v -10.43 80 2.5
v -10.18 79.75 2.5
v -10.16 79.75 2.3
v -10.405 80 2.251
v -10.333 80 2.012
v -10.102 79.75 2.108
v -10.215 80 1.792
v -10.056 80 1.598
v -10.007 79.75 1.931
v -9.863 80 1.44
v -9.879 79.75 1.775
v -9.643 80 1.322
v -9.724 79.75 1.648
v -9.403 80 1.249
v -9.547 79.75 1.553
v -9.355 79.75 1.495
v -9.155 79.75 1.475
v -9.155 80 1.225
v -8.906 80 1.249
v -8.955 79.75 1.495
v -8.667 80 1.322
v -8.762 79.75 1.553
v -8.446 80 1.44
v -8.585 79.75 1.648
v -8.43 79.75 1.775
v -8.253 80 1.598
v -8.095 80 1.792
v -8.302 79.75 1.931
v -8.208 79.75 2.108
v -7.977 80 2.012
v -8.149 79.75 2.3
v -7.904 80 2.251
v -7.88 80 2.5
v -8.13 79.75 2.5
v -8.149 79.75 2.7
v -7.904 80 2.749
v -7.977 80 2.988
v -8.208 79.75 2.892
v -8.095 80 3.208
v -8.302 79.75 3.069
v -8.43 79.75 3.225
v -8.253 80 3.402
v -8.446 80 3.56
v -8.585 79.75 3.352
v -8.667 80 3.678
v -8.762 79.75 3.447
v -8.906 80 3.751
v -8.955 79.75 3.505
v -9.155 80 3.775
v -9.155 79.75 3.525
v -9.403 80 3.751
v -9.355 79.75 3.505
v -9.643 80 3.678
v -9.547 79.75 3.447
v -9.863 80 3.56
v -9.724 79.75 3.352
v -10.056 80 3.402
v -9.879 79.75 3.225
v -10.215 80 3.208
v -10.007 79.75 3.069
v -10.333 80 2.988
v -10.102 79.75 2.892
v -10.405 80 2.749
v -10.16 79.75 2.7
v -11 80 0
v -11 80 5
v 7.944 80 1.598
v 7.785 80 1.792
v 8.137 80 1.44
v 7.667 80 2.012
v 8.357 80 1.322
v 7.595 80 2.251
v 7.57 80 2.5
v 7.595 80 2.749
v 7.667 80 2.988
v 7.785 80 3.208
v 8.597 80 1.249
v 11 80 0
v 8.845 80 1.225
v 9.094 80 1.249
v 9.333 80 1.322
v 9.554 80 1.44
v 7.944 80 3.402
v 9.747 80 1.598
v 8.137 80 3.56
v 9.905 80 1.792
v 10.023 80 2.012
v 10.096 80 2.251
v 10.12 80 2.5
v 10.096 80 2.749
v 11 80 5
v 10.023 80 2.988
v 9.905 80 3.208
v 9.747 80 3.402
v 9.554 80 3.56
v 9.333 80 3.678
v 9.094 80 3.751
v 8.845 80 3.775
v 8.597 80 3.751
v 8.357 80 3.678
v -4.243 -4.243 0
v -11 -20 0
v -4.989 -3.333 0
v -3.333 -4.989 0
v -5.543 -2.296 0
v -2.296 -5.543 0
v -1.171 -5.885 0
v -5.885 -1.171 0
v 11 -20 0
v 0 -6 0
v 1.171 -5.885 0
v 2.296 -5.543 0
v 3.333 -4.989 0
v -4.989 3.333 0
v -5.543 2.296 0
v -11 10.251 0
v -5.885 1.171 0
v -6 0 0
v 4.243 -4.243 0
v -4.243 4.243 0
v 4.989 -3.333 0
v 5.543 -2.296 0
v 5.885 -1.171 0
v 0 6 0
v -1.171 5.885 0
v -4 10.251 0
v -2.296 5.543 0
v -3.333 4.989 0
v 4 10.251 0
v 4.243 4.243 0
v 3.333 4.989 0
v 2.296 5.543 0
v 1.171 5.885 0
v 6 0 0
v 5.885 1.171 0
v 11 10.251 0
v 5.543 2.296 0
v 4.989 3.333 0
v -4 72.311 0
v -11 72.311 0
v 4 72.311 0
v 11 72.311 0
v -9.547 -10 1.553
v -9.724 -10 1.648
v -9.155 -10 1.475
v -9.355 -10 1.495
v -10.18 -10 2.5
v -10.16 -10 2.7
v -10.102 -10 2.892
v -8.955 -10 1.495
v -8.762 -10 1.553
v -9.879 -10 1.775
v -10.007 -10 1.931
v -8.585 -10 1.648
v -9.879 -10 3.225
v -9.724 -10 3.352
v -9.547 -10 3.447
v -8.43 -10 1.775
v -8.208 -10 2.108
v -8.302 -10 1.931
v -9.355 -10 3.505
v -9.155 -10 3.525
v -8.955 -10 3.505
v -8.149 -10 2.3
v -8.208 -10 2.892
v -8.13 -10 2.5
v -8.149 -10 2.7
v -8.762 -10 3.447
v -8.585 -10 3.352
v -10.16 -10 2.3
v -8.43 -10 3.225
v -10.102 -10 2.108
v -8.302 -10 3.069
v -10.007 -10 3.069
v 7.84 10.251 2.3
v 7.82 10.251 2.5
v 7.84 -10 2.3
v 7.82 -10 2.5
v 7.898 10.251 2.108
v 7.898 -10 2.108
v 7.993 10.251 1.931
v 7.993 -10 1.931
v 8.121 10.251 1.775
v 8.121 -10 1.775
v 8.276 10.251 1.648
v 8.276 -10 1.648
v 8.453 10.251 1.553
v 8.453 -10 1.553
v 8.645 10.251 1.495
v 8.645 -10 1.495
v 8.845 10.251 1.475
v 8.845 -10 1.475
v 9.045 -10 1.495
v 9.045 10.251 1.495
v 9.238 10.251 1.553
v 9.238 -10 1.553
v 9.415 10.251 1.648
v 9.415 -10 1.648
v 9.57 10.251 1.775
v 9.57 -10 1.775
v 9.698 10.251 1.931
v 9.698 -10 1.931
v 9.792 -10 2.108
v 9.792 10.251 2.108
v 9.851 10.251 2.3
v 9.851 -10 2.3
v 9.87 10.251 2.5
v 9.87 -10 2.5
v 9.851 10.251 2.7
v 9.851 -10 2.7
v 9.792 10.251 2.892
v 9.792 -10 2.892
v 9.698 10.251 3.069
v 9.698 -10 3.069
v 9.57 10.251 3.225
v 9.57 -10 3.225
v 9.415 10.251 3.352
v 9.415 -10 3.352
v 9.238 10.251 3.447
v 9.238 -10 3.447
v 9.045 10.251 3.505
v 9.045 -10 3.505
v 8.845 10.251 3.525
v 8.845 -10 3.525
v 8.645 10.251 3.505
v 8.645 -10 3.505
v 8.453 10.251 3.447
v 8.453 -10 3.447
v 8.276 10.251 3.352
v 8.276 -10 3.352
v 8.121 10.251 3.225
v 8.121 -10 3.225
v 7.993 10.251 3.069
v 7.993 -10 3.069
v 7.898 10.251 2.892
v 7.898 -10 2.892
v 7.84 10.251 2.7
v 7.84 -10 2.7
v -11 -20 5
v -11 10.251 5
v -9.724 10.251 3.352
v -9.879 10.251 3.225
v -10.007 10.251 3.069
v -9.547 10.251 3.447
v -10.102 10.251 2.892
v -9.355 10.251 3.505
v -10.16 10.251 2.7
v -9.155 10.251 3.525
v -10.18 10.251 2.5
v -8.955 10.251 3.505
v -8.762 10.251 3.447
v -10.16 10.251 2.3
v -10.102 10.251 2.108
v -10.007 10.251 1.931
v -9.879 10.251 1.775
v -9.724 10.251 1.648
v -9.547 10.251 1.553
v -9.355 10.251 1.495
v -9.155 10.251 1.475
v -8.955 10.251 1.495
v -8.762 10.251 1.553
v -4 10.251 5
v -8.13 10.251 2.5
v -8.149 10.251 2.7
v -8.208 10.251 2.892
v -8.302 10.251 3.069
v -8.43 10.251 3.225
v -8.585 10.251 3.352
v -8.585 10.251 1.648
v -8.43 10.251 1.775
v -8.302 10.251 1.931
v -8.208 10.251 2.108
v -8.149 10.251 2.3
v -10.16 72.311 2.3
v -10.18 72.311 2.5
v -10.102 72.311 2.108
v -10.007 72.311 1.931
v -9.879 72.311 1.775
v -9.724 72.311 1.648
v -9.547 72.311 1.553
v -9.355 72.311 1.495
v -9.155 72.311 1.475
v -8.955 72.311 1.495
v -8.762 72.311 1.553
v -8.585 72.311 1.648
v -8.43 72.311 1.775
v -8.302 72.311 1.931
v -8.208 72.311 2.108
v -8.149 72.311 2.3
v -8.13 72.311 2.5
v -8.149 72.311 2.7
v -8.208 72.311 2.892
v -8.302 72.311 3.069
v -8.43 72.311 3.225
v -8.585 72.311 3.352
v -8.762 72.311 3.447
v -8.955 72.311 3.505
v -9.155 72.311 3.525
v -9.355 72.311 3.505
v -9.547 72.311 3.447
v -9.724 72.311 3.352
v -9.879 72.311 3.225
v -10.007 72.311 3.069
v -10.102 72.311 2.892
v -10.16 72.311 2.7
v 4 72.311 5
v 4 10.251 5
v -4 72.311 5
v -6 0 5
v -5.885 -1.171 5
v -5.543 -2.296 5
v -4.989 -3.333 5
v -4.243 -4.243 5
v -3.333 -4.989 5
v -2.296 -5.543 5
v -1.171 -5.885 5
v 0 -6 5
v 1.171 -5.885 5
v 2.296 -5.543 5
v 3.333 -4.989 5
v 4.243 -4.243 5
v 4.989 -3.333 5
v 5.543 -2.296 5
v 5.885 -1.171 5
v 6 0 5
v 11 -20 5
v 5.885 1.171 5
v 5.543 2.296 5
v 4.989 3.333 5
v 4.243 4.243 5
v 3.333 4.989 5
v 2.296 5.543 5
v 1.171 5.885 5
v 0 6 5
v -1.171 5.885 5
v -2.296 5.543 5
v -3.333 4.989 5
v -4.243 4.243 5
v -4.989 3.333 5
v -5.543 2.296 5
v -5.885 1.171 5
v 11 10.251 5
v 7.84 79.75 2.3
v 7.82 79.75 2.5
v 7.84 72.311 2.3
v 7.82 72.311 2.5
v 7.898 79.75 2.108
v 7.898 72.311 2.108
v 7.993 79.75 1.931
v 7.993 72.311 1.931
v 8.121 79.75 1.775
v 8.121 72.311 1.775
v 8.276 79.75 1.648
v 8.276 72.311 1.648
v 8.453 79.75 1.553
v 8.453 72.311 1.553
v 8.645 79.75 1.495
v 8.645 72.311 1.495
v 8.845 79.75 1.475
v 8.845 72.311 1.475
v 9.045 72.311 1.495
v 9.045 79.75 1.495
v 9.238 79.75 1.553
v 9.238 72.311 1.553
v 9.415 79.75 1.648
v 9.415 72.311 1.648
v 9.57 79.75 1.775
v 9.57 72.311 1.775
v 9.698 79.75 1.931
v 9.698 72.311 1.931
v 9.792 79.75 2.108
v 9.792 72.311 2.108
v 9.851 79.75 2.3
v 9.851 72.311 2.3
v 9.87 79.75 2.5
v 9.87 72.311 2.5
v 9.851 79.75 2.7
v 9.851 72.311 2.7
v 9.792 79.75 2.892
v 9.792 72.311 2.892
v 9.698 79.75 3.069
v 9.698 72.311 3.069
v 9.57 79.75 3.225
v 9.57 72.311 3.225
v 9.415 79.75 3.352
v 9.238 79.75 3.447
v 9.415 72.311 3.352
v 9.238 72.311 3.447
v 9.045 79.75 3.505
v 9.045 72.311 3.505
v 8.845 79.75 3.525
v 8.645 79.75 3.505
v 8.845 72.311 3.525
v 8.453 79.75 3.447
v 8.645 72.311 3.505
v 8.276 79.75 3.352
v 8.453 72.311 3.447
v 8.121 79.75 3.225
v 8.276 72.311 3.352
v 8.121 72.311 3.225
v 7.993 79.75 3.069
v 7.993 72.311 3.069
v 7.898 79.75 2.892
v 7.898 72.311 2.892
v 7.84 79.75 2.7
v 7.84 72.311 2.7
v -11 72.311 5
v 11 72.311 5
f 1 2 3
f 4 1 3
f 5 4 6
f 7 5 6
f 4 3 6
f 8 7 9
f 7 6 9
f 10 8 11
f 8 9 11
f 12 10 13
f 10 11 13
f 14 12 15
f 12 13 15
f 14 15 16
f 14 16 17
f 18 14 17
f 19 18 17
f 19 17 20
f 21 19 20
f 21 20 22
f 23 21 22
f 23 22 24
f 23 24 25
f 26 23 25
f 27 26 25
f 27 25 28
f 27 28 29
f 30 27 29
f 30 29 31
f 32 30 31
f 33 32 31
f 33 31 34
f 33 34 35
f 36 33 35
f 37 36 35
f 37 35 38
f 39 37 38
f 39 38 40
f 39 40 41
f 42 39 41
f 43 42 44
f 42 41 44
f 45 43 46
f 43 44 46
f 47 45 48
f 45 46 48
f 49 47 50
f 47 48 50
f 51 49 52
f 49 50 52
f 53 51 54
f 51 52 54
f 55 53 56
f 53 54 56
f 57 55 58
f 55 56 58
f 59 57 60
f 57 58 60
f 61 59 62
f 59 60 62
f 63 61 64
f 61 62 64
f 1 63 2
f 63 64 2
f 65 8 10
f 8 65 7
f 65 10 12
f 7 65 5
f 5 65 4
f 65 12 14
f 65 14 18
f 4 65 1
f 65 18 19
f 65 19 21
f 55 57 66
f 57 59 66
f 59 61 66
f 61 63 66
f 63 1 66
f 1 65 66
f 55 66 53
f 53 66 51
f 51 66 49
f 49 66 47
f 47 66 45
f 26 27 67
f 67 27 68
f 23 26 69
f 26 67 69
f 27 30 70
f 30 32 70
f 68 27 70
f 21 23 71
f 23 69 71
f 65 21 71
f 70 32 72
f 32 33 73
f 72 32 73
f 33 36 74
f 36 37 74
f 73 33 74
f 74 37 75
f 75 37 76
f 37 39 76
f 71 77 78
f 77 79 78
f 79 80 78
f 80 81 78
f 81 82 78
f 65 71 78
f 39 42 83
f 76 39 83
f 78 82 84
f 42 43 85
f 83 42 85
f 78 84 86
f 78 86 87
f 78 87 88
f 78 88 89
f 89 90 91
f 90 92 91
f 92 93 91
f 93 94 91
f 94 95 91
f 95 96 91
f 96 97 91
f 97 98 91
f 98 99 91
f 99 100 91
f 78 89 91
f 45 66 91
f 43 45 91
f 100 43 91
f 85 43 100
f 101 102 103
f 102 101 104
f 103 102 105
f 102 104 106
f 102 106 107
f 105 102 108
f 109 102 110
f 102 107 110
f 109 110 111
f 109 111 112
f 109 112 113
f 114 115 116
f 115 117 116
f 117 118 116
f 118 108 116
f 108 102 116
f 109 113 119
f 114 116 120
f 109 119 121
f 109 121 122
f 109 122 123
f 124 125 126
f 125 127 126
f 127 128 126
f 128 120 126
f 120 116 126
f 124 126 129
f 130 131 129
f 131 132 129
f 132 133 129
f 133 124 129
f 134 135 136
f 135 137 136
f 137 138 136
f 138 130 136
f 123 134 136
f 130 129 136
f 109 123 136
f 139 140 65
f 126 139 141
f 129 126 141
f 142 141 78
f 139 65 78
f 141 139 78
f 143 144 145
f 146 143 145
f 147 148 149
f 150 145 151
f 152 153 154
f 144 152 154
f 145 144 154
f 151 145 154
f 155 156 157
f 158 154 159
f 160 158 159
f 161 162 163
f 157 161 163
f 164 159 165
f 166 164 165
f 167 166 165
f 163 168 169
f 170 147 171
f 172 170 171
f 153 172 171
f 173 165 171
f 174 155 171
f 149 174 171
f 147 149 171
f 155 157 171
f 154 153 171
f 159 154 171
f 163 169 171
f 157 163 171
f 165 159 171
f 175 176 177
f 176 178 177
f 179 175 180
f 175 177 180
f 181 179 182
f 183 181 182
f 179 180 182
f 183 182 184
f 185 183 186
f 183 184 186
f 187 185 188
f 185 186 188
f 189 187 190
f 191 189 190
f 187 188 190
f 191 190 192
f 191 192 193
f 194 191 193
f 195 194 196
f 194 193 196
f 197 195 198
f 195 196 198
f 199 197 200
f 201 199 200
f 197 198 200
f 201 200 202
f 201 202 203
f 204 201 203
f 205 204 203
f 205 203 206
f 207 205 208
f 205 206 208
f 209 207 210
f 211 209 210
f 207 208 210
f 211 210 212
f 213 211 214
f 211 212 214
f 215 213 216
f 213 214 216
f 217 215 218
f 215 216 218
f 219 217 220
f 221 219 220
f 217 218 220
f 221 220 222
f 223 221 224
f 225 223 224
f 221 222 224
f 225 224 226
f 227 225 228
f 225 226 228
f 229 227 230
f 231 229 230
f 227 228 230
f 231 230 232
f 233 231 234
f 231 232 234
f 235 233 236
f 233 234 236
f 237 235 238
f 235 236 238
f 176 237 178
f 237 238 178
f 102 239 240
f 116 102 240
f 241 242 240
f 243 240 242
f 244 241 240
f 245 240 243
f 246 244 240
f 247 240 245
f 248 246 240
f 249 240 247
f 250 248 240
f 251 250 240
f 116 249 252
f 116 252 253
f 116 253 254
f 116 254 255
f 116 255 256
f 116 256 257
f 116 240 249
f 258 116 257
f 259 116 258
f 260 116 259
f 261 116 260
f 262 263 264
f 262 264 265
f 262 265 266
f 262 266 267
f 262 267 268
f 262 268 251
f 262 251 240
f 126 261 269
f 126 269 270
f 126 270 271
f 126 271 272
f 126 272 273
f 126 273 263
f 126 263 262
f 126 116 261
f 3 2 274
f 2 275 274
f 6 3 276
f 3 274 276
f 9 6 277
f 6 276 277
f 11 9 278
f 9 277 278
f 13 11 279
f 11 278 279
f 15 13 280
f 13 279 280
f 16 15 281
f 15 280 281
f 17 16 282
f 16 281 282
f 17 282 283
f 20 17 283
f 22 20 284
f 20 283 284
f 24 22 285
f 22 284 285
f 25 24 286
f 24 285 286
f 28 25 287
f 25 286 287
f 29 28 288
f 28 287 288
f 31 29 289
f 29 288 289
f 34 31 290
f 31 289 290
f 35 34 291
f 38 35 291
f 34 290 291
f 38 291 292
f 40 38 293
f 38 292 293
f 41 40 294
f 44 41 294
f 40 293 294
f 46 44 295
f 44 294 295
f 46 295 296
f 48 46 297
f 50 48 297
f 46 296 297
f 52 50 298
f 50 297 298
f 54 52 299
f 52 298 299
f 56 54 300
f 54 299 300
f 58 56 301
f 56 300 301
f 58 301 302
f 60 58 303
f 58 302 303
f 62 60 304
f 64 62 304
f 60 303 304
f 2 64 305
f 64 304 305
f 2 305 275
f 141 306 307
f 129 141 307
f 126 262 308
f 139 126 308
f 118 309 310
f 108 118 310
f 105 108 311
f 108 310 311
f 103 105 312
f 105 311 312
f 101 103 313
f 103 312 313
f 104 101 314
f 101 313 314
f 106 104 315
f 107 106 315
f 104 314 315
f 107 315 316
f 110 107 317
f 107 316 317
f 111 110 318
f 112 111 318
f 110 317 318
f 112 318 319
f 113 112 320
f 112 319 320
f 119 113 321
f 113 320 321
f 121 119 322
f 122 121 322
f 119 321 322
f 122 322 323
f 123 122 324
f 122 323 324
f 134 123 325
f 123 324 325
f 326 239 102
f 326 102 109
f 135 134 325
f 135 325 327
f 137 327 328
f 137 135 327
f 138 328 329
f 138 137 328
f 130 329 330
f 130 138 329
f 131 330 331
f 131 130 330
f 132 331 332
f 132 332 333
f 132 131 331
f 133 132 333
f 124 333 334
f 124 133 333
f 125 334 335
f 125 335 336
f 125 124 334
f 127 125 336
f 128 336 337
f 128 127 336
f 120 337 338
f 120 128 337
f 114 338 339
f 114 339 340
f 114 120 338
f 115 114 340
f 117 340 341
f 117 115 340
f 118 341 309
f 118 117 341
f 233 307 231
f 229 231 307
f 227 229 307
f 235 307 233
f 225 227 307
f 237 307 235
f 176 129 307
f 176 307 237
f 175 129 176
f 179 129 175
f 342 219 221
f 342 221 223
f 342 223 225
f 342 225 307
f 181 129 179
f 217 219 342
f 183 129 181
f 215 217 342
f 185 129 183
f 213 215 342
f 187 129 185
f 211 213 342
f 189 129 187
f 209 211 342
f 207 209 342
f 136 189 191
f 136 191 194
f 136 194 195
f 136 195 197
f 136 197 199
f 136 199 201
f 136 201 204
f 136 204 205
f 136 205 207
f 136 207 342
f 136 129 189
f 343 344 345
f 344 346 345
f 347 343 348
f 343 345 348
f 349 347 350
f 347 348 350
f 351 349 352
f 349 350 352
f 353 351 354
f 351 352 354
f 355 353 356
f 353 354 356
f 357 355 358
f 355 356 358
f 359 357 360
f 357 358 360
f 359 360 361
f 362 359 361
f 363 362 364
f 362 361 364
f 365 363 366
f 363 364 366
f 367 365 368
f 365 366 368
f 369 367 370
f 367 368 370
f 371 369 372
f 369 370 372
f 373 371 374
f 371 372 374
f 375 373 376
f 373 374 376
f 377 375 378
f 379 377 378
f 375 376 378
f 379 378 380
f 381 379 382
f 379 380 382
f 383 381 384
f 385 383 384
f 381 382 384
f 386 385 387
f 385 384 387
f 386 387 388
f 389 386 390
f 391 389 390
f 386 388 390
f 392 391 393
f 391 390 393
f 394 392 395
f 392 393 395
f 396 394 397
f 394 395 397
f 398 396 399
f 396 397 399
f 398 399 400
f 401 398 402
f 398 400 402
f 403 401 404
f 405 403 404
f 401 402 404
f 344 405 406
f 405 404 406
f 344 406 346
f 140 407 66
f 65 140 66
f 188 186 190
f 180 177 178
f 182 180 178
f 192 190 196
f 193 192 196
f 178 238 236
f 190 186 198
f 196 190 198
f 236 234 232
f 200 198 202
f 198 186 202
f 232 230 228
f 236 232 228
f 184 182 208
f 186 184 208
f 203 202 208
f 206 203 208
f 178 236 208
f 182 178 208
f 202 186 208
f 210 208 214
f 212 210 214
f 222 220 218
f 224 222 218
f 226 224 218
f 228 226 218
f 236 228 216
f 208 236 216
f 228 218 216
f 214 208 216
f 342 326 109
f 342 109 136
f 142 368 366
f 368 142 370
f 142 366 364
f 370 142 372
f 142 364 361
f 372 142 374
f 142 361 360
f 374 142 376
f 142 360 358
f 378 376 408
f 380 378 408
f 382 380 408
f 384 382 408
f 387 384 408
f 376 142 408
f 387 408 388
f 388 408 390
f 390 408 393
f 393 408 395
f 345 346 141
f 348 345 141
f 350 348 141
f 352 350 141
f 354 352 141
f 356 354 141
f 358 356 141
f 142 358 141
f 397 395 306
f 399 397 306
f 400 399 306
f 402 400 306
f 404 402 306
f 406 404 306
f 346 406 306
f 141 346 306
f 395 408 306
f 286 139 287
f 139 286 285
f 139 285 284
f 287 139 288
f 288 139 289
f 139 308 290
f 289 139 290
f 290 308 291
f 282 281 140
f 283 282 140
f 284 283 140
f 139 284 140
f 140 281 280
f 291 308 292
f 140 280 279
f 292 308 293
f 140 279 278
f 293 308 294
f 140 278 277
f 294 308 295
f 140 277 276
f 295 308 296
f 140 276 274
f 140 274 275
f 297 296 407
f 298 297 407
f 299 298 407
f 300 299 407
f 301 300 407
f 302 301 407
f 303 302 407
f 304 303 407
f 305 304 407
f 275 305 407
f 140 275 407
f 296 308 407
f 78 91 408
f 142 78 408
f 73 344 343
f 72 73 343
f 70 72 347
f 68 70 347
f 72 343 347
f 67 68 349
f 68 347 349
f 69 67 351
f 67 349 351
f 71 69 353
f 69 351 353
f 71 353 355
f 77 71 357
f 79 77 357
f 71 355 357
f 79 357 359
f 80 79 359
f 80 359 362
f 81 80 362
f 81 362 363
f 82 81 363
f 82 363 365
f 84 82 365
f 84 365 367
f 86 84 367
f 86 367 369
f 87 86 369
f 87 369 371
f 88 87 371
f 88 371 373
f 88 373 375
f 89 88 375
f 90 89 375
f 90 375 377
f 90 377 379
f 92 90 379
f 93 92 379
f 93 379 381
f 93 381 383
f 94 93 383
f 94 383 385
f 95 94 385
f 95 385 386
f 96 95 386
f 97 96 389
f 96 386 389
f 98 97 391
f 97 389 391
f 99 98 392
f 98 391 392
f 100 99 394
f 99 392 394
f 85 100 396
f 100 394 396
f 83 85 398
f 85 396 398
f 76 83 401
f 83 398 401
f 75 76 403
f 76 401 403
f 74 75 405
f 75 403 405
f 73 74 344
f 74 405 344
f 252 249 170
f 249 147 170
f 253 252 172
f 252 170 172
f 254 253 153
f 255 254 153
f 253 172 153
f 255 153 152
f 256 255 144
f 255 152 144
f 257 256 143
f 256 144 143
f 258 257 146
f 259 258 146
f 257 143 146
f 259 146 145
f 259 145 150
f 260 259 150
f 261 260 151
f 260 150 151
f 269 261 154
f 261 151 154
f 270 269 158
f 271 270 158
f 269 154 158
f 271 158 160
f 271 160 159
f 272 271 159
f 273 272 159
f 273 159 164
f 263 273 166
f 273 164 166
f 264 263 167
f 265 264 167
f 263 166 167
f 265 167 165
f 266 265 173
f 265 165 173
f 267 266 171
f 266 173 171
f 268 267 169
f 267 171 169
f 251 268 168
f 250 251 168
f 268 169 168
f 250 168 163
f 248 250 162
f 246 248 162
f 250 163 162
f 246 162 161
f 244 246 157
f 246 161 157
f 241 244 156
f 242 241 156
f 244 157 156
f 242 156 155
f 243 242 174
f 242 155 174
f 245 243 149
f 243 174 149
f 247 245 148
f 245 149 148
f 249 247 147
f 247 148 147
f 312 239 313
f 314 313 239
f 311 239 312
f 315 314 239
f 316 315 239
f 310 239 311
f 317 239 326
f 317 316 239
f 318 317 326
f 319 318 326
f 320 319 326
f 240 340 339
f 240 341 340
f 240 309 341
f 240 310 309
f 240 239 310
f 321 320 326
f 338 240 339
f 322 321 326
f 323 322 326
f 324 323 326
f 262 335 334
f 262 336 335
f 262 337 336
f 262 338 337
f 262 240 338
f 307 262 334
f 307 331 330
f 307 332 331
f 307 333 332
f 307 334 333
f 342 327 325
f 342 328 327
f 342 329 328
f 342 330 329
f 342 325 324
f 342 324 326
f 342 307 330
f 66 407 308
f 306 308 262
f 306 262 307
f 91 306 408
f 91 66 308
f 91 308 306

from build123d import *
from build123d.topology import SkipClean

# Parameters (mm, degrees)
EXTRUDE_1_DEPTH                = 5
EXTRUDE_2_DEPTH                = 5
EXTRUDE_START                  = -5
EXTRUDE_3_DEPTH                = 5
HOLE_WIZARD_M2_5_1_D           = 2.05
HOLE_WIZARD_M2_5_1_CSINK_D     = 2.55
HOLE_WIZARD_M2_5_1_CSINK_ANGLE = 90
SKETCH_7_W                     = 22
SKETCH_7_H                     = 10
EXTRUDE_4_DEPTH                = 5


with BuildPart() as part:
    # 草图1 → 凸台-拉伸1 (new body)
    with BuildSketch(Plane.XY):
        with BuildLine():
            Line((-6, 0), (-11, 0))
            Line((-11, 0), (-11, 10.250706887))
            Line((-11, 10.250706887), (11, 10.250706887))
            Line((11, 10.250706887), (11, 0))
            Line((11, 0), (6, 0))
            ThreePointArc((6, 0), (0, 6), (-6, 0))
        make_face()
    extrude(amount=EXTRUDE_1_DEPTH)

    # 草图2 → 凸台-拉伸2 (add)
    with BuildSketch(Plane.XY.offset(5)):
        Polygon((4, 72.311119812), (4, 10.250706887), (-4, 10.250706887), (-4, 72.311119812), (-11, 72.311119812), (-11, 80), (11, 80), (11, 72.311119812), align=None)
    extrude(amount=-EXTRUDE_2_DEPTH)

    # 草图6 → 凸台-拉伸3 (add)
    with SkipClean():  # the faces are left unmerged after this step: merging them gives an invalid solid
        with BuildSketch(Plane(origin=(0, 0, 0), x_dir=(-1, 0, 0), z_dir=(0, 0, -1)).offset(EXTRUDE_START)):
            with BuildLine():
                Line((-11, 0), (-11, -10))
                Line((-11, -10), (11, -10))
                Line((11, -10), (11, 0))
                Line((11, 0), (6, 0))
                ThreePointArc((6, 0), (0, -6), (-6, 0))
                Line((-6, 0), (-11, 0))
            make_face()
        extrude(amount=EXTRUDE_3_DEPTH)
    add(part.part.scale(1), mode=Mode.REPLACE)  # the faces are merged on a copy

    # M2.5 螺纹孔1 (through all)
    with Locations(Plane(origin=(0, 80, 0), x_dir=(1, 0, 0), z_dir=(0, 1, 0))):
        with Locations((-9.154712184, -2.5), (8.845287816, -2.5)):
            CounterSinkHole(HOLE_WIZARD_M2_5_1_D / 2, HOLE_WIZARD_M2_5_1_CSINK_D / 2, counter_sink_angle=HOLE_WIZARD_M2_5_1_CSINK_ANGLE)

    # 草图7 → 凸台-拉伸4 (add)
    with BuildSketch(Plane.XY.offset(5)):
        with Locations((0, -15)):
            Rectangle(SKETCH_7_W, SKETCH_7_H)
    extrude(amount=-EXTRUDE_4_DEPTH)


solid = part.part
